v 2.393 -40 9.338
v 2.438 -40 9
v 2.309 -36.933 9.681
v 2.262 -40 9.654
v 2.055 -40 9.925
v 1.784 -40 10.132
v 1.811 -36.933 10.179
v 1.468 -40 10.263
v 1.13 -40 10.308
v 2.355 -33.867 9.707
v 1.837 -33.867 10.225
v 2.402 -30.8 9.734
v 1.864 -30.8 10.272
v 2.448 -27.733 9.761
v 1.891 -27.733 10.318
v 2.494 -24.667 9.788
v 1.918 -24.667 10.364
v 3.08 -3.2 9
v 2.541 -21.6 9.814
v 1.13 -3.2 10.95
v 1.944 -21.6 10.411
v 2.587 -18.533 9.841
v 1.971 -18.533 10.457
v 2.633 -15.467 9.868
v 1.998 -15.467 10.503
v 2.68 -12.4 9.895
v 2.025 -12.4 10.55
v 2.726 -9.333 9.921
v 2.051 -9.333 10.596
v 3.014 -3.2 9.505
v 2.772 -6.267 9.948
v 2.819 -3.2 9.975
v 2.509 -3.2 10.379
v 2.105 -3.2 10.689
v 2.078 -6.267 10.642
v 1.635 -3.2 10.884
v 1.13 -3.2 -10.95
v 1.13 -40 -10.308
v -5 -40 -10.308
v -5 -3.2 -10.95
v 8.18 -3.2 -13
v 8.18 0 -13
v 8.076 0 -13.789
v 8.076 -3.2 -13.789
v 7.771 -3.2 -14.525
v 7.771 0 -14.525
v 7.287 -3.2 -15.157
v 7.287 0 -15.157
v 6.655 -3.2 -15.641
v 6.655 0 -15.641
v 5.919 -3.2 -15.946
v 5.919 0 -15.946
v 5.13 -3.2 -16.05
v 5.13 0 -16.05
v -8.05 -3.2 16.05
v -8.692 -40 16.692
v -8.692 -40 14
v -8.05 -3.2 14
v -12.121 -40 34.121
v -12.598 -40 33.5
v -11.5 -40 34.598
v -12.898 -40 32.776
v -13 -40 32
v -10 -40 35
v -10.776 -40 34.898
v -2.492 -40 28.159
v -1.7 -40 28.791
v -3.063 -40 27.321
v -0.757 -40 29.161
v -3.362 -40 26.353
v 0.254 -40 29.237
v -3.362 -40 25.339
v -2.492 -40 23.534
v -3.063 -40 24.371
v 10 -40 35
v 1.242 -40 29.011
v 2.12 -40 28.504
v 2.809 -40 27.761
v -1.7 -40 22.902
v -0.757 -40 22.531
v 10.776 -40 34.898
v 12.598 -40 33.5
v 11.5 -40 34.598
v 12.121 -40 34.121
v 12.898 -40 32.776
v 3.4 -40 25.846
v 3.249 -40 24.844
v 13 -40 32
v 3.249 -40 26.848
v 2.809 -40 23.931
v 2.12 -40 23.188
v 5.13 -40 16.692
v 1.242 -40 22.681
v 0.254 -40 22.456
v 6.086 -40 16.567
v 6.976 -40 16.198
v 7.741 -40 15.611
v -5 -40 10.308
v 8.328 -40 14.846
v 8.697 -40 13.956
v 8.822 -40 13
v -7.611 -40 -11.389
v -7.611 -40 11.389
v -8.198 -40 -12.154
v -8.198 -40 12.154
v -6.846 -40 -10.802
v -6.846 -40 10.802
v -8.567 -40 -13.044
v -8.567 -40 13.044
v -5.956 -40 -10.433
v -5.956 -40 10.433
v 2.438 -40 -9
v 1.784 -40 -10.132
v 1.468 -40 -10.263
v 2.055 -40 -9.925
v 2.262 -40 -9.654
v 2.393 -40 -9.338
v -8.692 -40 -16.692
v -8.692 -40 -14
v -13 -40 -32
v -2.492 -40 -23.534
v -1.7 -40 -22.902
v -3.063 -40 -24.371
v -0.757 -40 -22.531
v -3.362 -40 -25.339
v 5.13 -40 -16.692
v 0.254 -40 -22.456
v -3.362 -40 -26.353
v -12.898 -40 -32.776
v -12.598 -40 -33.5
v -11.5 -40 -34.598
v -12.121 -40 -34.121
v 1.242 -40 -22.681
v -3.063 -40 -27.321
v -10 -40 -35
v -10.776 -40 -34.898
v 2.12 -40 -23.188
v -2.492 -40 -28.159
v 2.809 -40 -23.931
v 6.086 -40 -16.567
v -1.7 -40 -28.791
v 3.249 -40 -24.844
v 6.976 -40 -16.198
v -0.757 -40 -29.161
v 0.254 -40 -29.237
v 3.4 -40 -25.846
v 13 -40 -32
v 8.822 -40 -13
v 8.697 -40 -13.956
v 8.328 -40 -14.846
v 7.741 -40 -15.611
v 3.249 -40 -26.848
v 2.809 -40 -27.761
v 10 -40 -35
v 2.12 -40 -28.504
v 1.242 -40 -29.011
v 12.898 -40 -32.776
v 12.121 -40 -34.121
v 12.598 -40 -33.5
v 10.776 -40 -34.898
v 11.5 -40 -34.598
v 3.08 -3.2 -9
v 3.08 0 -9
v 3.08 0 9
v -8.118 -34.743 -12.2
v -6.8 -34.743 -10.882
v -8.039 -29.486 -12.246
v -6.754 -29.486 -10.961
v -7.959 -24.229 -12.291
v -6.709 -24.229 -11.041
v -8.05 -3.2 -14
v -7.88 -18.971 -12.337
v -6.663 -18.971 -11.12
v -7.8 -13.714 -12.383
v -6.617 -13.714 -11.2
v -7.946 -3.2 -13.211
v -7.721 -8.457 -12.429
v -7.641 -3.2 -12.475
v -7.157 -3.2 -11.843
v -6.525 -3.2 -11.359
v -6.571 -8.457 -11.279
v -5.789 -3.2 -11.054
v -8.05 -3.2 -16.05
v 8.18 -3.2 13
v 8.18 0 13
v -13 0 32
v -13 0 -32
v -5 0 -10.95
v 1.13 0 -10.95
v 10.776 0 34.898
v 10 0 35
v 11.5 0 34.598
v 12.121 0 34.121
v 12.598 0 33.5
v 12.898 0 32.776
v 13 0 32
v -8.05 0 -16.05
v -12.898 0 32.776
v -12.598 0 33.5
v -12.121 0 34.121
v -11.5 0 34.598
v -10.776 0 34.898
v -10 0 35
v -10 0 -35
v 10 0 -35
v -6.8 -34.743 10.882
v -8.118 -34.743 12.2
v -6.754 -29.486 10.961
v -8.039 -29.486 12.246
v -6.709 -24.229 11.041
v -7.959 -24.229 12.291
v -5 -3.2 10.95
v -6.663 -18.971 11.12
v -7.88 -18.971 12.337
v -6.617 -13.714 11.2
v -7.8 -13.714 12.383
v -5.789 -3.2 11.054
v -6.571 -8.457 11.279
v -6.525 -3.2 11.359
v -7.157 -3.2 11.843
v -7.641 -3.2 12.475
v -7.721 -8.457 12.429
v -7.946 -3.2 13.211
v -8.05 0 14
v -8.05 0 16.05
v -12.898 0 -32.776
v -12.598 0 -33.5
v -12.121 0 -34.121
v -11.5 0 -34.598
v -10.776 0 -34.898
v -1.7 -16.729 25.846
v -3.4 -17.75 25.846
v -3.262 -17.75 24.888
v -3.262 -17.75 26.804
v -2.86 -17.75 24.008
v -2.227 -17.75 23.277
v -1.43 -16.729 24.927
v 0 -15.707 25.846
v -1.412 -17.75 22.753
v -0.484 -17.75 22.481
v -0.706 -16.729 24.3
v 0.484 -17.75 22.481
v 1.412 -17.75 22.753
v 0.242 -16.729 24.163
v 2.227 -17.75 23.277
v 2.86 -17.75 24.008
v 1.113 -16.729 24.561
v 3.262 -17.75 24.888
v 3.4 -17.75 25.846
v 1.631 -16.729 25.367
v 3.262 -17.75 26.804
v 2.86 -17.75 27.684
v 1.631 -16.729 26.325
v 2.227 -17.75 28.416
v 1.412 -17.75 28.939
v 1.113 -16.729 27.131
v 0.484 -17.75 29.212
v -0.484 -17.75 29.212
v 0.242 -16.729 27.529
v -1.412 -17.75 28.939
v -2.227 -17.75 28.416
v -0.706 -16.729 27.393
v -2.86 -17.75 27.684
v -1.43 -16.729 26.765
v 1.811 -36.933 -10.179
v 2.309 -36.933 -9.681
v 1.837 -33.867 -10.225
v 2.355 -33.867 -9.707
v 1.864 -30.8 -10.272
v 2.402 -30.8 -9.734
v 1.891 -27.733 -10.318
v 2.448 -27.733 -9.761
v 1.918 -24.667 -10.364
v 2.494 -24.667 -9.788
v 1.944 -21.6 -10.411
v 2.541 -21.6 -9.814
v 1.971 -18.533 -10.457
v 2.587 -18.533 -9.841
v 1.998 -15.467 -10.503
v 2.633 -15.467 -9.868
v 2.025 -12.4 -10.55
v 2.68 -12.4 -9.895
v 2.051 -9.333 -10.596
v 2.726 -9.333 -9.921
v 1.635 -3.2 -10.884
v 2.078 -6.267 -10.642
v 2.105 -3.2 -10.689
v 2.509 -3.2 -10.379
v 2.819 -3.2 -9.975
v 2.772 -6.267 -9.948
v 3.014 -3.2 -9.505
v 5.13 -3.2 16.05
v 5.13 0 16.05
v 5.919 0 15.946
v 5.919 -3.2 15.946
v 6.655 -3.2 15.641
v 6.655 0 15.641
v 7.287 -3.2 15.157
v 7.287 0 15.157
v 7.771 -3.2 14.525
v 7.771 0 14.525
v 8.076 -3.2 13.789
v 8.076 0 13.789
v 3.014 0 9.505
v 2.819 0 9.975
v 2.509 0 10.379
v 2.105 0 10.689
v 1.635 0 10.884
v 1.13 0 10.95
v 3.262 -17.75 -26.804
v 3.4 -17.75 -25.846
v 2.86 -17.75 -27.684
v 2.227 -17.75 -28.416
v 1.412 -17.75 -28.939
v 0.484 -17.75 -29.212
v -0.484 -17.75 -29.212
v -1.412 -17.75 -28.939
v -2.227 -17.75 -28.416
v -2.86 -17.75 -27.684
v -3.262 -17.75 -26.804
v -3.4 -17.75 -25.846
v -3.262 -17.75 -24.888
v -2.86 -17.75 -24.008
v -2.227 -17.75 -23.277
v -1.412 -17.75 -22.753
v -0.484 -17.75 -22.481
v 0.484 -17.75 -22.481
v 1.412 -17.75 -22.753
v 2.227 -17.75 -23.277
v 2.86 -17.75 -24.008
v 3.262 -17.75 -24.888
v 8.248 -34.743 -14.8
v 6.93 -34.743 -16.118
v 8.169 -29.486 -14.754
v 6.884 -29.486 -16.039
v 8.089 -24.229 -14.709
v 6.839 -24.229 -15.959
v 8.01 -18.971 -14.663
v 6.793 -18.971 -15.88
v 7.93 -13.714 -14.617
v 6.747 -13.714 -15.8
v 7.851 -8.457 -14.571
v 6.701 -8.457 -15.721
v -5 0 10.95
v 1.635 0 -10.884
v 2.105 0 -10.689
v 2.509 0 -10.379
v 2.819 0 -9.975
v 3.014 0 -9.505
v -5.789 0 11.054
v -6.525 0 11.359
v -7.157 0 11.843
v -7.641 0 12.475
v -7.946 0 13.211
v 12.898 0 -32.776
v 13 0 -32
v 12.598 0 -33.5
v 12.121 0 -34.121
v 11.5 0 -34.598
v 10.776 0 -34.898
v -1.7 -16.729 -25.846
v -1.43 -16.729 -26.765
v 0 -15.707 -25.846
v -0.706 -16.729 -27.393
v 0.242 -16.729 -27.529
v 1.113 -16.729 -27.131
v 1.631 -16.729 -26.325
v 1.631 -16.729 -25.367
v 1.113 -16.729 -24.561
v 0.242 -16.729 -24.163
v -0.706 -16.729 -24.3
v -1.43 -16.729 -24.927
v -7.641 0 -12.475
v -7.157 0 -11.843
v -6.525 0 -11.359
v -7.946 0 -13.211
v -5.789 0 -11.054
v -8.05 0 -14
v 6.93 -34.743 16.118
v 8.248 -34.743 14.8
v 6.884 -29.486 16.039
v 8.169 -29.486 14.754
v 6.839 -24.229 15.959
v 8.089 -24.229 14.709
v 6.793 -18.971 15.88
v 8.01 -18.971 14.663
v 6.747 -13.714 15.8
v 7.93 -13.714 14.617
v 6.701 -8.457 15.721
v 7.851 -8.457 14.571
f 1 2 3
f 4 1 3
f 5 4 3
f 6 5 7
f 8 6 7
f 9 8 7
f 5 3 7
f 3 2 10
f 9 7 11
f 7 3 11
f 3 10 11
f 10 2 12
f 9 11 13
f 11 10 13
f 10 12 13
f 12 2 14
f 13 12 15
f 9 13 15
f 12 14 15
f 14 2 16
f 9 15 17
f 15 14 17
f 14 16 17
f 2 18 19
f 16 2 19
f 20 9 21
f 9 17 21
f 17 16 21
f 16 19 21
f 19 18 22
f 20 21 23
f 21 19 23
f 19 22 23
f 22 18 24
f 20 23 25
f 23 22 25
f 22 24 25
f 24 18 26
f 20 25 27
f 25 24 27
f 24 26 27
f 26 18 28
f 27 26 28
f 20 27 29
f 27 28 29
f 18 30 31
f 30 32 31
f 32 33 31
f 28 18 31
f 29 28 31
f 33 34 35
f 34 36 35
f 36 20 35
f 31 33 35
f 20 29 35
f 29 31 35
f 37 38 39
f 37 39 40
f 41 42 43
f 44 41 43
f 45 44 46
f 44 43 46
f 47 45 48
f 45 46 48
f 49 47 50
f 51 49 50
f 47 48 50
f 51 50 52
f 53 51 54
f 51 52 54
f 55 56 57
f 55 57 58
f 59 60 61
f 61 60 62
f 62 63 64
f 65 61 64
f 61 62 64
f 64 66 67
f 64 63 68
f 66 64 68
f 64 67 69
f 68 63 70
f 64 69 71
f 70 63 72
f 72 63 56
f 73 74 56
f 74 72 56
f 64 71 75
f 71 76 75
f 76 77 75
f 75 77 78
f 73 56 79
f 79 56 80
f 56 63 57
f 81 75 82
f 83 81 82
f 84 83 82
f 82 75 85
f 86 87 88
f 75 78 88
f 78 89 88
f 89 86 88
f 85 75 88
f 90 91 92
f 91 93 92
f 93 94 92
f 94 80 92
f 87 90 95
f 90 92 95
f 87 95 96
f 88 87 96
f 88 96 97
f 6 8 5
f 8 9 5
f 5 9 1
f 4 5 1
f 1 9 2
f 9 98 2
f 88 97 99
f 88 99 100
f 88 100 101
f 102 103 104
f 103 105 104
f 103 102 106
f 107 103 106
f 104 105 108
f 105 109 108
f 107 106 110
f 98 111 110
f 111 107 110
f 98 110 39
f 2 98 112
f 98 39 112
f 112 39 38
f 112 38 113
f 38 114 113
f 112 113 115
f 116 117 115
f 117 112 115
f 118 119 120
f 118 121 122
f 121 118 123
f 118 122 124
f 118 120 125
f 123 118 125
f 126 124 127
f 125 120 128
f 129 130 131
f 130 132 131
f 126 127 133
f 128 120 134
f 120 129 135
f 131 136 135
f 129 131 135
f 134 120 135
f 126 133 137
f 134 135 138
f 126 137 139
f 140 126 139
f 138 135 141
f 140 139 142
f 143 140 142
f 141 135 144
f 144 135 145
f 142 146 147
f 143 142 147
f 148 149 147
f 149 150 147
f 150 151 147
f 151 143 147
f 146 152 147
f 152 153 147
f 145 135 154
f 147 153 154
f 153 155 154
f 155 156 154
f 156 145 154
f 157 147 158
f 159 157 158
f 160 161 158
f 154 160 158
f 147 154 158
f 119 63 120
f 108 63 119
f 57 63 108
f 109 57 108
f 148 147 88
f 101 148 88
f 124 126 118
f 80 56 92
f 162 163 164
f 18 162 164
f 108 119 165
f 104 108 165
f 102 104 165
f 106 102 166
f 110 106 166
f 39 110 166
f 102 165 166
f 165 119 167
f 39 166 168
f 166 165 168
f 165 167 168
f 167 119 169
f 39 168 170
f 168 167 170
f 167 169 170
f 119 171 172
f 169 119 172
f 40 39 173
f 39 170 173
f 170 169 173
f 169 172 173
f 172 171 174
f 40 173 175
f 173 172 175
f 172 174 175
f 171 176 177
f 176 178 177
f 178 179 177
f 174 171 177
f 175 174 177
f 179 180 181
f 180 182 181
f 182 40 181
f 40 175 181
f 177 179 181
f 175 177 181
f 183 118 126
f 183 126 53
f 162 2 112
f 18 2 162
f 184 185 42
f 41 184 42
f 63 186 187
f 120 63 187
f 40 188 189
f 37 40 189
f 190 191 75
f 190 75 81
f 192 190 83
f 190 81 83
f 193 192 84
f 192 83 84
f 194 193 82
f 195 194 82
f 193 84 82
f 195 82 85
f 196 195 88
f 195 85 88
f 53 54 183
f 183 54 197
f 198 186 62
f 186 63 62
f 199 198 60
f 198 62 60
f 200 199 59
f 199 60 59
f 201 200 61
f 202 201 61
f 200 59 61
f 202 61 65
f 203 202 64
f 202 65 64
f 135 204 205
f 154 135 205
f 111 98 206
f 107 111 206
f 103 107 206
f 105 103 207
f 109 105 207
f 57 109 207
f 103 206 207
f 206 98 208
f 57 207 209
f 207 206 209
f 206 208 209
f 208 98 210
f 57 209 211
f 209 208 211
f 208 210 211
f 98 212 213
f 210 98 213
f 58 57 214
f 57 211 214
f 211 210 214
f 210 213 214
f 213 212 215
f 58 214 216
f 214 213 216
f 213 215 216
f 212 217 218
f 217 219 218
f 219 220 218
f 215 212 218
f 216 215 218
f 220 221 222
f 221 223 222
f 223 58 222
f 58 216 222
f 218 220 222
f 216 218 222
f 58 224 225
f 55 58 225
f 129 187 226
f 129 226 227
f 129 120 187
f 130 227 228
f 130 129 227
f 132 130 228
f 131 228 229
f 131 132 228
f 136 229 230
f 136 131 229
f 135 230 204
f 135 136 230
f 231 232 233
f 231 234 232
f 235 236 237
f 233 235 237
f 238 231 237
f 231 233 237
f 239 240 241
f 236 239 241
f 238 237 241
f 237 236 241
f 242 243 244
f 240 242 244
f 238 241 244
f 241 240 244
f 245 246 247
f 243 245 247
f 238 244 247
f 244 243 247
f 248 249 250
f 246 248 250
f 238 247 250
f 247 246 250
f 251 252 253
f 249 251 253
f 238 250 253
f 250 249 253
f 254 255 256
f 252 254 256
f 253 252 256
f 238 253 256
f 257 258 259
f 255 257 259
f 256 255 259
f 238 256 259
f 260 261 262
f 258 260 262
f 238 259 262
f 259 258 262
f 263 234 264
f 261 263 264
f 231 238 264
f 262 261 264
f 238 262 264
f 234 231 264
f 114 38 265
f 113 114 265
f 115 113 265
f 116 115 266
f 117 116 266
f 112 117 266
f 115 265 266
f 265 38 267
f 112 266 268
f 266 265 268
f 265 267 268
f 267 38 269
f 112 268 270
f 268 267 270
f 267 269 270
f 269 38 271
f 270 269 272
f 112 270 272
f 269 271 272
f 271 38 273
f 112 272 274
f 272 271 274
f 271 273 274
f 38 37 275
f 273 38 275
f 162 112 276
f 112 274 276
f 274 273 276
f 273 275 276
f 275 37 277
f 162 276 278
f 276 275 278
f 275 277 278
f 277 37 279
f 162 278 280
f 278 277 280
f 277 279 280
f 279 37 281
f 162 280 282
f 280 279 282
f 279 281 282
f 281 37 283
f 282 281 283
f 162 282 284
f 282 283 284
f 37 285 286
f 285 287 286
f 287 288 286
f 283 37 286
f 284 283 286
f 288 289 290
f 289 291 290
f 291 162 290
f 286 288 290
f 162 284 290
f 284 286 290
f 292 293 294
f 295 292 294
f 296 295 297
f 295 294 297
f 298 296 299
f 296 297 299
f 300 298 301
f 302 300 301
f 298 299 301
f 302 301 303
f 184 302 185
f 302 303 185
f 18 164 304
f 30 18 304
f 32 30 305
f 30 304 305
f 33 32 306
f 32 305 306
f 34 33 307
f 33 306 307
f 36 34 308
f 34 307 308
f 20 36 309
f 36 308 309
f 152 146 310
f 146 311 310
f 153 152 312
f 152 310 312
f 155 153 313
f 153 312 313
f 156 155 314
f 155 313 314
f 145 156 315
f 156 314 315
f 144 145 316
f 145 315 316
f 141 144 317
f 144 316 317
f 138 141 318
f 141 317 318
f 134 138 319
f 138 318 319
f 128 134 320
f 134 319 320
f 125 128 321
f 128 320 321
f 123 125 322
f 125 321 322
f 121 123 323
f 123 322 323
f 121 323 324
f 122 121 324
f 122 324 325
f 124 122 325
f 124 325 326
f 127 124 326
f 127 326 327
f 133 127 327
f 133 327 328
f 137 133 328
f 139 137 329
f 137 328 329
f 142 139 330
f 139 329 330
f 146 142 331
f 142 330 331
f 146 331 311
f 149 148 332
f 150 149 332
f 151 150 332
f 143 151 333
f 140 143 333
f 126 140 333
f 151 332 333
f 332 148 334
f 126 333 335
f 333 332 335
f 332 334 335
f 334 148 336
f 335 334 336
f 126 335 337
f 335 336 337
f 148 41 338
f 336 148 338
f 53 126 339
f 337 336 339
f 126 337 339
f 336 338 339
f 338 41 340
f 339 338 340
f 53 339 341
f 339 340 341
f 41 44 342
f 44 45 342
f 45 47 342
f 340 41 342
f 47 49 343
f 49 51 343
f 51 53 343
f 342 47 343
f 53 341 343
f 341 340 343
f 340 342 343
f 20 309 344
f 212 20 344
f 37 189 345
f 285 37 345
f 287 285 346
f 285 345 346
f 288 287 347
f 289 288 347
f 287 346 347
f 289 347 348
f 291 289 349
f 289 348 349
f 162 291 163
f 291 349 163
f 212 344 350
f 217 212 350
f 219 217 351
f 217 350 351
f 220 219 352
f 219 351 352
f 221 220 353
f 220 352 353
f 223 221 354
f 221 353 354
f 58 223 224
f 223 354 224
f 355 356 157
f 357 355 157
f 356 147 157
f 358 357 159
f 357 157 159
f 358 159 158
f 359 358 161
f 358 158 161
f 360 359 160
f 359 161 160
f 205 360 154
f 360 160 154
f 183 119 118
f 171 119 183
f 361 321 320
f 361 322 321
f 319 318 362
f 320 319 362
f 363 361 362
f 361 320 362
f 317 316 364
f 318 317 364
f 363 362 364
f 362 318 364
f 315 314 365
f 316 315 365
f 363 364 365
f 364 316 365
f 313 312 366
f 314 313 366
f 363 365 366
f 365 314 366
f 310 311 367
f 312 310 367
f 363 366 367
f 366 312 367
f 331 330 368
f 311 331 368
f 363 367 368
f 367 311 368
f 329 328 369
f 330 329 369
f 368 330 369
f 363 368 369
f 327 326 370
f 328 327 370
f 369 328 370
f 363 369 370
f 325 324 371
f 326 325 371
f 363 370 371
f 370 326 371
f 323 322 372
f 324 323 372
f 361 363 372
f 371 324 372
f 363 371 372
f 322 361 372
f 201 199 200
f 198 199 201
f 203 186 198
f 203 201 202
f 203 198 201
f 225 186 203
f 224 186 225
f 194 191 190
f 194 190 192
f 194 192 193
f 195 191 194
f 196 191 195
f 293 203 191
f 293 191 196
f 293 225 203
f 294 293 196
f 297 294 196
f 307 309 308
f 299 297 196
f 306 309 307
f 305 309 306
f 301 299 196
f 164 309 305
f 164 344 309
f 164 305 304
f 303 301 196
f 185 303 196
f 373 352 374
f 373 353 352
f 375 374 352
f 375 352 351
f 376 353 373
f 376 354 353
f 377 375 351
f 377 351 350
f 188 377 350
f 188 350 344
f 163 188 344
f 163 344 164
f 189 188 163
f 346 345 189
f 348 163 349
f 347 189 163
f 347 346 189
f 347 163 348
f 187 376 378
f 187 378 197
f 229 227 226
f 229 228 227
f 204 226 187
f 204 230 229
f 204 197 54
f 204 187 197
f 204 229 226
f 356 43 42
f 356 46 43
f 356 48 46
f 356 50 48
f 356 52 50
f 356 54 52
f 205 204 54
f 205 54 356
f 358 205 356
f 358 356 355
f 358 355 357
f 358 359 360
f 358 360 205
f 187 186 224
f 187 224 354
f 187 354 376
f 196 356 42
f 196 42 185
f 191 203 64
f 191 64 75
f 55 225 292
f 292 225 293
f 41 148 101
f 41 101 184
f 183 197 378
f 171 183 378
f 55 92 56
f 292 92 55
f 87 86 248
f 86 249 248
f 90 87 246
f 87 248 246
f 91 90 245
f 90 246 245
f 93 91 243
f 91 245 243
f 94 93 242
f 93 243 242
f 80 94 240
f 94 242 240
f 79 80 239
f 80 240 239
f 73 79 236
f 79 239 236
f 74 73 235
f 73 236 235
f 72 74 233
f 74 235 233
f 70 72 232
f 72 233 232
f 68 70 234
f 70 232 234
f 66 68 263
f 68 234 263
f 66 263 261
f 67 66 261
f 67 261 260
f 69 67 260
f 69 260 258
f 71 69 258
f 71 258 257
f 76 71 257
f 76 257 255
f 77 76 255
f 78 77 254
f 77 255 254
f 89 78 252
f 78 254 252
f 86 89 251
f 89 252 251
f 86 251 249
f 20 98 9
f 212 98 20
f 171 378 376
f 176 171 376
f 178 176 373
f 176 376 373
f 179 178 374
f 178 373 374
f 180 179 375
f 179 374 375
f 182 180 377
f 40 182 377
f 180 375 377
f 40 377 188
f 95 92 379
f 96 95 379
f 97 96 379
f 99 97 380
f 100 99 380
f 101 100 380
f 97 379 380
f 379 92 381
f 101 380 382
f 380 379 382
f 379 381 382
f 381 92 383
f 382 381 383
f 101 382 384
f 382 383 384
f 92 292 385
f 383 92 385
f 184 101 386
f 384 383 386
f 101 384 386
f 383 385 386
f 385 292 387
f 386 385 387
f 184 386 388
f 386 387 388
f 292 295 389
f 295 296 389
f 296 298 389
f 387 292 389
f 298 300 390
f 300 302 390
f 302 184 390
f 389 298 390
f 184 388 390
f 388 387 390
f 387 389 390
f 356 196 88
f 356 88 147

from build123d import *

# Parameters (mm, degrees)
SKETCH1_W             = 26
SKETCH1_H             = 70
BOSS_EXTRUDE1_DEPTH   = 40
FILLET1_R             = 3
CUT_EXTRUDE1_REACH    = 56.717
M8_TAPPED_HOLE1_D     = 6.8
M8_TAPPED_HOLE1_DEPTH = 22.25
M8_TAPPED_HOLE1_TIP   = 2.042926105


with BuildPart() as part:
    # Sketch1 → Boss-Extrude1 (new body)
    with BuildSketch(Plane(origin=(0, 0, 0), x_dir=(1, 0, 0), z_dir=(0, 1, 0))):
        Rectangle(SKETCH1_W, SKETCH1_H)
    extrude(amount=-BOSS_EXTRUDE1_DEPTH)

    # Fillet1
    fillet1_edges = [part.edges().sort_by_distance(p)[0] for p in [
        (13, -20, 35),
        (-13, -20, 35),
        (-13, -20, -35),
        (13, -20, -35),
    ]]
    fillet(fillet1_edges, radius=FILLET1_R)

    # Sketch9 → Cut-Extrude1 (cut, up to next)
    with BuildSketch(Plane(origin=(0, 0, 0), x_dir=(1, 0, 0), z_dir=(0, 1, 0)), mode=Mode.PRIVATE) as cut_extrude1_sk1:
        with BuildLine():
            Line((3.08, 9), (3.08, -9))
            ThreePointArc((3.08, -9), (2.508858223, -10.378858223), (1.13, -10.95))
            Line((1.13, -10.95), (-5, -10.95))
            ThreePointArc((-5, -10.95), (-7.156675683, -11.843324317), (-8.05, -14))
            Line((-8.05, -14), (-8.05, -16.05))
            Line((-8.05, -16.05), (5.13, -16.05))
            ThreePointArc((5.13, -16.05), (7.286675683, -15.156675683), (8.18, -13))
            Line((8.18, -13), (8.18, 13))
            ThreePointArc((8.18, 13), (7.286675683, 15.156675683), (5.13, 16.05))
            Line((5.13, 16.05), (-8.05, 16.05))
            Line((-8.05, 16.05), (-8.05, 14))
            ThreePointArc((-8.05, 14), (-7.156675683, 11.843324317), (-5, 10.95))
            Line((-5, 10.95), (1.13, 10.95))
            ThreePointArc((1.13, 10.95), (2.508858223, 10.378858223), (3.08, 9))
        make_face()
    cut_extrude1_tool1 = extrude(cut_extrude1_sk1.sketch, amount=-CUT_EXTRUDE1_REACH, mode=Mode.PRIVATE) & part.part
    add(cut_extrude1_tool1.solids().sort_by_distance((3.439697, 0, 0))[0], mode=Mode.SUBTRACT)

    # Cut-Sweep1: sweep along a path in Sketch12
    with BuildLine(Plane(origin=(0, 0, 0), x_dir=(1, 0, 0), z_dir=(0, 1, 0))) as cut_sweep1_path:
        Line((-8.05, -14), (-8.05, -16.05))
        Line((-8.05, -16.05), (5.13, -16.05))
        ThreePointArc((5.13, -16.05), (7.286675683, -15.156675683), (8.18, -13))
        Line((8.18, -13), (8.18, 13))
        ThreePointArc((8.18, 13), (7.286675683, 15.156675683), (5.13, 16.05))
        Line((5.13, 16.05), (-8.05, 16.05))
        Line((-8.05, 16.05), (-8.05, 14))
        ThreePointArc((-8.05, 14), (-7.156675683, 11.843324317), (-5, 10.95))
        Line((-5, 10.95), (1.13, 10.95))
        ThreePointArc((1.13, 10.95), (2.508858223, 10.378858223), (3.08, 9))
        Line((3.08, 9), (3.08, -9))
        ThreePointArc((3.08, -9), (2.508858223, -10.378858223), (1.13, -10.95))
        Line((1.13, -10.95), (-5, -10.95))
        ThreePointArc((-5, -10.95), (-7.156675683, -11.843324317), (-8.05, -14))
    # Sketch11 → Cut-Sweep1 (sweep, cut)
    with BuildSketch(Plane.XY):
        Polygon((8.18, -3.2), (8.822346389, -40), (8.18, -40), align=None)
    sweep(path=cut_sweep1_path.line, transition=Transition.RIGHT, mode=Mode.SUBTRACT)

    # M8 Tapped Hole1
    with Locations(Plane(origin=(0, -40, 0), x_dir=(-1, 0, 0), z_dir=(0, -1, 0))):
        with Locations((0, -25.846173195), (0, 25.846173195)):
            Hole(M8_TAPPED_HOLE1_D / 2, depth=M8_TAPPED_HOLE1_DEPTH)
            with Locations((0, 0, -(M8_TAPPED_HOLE1_DEPTH + M8_TAPPED_HOLE1_TIP / 2))):  # 118° drill point
                Cone(0, M8_TAPPED_HOLE1_D / 2, M8_TAPPED_HOLE1_TIP, mode=Mode.SUBTRACT)


solid = part.part
